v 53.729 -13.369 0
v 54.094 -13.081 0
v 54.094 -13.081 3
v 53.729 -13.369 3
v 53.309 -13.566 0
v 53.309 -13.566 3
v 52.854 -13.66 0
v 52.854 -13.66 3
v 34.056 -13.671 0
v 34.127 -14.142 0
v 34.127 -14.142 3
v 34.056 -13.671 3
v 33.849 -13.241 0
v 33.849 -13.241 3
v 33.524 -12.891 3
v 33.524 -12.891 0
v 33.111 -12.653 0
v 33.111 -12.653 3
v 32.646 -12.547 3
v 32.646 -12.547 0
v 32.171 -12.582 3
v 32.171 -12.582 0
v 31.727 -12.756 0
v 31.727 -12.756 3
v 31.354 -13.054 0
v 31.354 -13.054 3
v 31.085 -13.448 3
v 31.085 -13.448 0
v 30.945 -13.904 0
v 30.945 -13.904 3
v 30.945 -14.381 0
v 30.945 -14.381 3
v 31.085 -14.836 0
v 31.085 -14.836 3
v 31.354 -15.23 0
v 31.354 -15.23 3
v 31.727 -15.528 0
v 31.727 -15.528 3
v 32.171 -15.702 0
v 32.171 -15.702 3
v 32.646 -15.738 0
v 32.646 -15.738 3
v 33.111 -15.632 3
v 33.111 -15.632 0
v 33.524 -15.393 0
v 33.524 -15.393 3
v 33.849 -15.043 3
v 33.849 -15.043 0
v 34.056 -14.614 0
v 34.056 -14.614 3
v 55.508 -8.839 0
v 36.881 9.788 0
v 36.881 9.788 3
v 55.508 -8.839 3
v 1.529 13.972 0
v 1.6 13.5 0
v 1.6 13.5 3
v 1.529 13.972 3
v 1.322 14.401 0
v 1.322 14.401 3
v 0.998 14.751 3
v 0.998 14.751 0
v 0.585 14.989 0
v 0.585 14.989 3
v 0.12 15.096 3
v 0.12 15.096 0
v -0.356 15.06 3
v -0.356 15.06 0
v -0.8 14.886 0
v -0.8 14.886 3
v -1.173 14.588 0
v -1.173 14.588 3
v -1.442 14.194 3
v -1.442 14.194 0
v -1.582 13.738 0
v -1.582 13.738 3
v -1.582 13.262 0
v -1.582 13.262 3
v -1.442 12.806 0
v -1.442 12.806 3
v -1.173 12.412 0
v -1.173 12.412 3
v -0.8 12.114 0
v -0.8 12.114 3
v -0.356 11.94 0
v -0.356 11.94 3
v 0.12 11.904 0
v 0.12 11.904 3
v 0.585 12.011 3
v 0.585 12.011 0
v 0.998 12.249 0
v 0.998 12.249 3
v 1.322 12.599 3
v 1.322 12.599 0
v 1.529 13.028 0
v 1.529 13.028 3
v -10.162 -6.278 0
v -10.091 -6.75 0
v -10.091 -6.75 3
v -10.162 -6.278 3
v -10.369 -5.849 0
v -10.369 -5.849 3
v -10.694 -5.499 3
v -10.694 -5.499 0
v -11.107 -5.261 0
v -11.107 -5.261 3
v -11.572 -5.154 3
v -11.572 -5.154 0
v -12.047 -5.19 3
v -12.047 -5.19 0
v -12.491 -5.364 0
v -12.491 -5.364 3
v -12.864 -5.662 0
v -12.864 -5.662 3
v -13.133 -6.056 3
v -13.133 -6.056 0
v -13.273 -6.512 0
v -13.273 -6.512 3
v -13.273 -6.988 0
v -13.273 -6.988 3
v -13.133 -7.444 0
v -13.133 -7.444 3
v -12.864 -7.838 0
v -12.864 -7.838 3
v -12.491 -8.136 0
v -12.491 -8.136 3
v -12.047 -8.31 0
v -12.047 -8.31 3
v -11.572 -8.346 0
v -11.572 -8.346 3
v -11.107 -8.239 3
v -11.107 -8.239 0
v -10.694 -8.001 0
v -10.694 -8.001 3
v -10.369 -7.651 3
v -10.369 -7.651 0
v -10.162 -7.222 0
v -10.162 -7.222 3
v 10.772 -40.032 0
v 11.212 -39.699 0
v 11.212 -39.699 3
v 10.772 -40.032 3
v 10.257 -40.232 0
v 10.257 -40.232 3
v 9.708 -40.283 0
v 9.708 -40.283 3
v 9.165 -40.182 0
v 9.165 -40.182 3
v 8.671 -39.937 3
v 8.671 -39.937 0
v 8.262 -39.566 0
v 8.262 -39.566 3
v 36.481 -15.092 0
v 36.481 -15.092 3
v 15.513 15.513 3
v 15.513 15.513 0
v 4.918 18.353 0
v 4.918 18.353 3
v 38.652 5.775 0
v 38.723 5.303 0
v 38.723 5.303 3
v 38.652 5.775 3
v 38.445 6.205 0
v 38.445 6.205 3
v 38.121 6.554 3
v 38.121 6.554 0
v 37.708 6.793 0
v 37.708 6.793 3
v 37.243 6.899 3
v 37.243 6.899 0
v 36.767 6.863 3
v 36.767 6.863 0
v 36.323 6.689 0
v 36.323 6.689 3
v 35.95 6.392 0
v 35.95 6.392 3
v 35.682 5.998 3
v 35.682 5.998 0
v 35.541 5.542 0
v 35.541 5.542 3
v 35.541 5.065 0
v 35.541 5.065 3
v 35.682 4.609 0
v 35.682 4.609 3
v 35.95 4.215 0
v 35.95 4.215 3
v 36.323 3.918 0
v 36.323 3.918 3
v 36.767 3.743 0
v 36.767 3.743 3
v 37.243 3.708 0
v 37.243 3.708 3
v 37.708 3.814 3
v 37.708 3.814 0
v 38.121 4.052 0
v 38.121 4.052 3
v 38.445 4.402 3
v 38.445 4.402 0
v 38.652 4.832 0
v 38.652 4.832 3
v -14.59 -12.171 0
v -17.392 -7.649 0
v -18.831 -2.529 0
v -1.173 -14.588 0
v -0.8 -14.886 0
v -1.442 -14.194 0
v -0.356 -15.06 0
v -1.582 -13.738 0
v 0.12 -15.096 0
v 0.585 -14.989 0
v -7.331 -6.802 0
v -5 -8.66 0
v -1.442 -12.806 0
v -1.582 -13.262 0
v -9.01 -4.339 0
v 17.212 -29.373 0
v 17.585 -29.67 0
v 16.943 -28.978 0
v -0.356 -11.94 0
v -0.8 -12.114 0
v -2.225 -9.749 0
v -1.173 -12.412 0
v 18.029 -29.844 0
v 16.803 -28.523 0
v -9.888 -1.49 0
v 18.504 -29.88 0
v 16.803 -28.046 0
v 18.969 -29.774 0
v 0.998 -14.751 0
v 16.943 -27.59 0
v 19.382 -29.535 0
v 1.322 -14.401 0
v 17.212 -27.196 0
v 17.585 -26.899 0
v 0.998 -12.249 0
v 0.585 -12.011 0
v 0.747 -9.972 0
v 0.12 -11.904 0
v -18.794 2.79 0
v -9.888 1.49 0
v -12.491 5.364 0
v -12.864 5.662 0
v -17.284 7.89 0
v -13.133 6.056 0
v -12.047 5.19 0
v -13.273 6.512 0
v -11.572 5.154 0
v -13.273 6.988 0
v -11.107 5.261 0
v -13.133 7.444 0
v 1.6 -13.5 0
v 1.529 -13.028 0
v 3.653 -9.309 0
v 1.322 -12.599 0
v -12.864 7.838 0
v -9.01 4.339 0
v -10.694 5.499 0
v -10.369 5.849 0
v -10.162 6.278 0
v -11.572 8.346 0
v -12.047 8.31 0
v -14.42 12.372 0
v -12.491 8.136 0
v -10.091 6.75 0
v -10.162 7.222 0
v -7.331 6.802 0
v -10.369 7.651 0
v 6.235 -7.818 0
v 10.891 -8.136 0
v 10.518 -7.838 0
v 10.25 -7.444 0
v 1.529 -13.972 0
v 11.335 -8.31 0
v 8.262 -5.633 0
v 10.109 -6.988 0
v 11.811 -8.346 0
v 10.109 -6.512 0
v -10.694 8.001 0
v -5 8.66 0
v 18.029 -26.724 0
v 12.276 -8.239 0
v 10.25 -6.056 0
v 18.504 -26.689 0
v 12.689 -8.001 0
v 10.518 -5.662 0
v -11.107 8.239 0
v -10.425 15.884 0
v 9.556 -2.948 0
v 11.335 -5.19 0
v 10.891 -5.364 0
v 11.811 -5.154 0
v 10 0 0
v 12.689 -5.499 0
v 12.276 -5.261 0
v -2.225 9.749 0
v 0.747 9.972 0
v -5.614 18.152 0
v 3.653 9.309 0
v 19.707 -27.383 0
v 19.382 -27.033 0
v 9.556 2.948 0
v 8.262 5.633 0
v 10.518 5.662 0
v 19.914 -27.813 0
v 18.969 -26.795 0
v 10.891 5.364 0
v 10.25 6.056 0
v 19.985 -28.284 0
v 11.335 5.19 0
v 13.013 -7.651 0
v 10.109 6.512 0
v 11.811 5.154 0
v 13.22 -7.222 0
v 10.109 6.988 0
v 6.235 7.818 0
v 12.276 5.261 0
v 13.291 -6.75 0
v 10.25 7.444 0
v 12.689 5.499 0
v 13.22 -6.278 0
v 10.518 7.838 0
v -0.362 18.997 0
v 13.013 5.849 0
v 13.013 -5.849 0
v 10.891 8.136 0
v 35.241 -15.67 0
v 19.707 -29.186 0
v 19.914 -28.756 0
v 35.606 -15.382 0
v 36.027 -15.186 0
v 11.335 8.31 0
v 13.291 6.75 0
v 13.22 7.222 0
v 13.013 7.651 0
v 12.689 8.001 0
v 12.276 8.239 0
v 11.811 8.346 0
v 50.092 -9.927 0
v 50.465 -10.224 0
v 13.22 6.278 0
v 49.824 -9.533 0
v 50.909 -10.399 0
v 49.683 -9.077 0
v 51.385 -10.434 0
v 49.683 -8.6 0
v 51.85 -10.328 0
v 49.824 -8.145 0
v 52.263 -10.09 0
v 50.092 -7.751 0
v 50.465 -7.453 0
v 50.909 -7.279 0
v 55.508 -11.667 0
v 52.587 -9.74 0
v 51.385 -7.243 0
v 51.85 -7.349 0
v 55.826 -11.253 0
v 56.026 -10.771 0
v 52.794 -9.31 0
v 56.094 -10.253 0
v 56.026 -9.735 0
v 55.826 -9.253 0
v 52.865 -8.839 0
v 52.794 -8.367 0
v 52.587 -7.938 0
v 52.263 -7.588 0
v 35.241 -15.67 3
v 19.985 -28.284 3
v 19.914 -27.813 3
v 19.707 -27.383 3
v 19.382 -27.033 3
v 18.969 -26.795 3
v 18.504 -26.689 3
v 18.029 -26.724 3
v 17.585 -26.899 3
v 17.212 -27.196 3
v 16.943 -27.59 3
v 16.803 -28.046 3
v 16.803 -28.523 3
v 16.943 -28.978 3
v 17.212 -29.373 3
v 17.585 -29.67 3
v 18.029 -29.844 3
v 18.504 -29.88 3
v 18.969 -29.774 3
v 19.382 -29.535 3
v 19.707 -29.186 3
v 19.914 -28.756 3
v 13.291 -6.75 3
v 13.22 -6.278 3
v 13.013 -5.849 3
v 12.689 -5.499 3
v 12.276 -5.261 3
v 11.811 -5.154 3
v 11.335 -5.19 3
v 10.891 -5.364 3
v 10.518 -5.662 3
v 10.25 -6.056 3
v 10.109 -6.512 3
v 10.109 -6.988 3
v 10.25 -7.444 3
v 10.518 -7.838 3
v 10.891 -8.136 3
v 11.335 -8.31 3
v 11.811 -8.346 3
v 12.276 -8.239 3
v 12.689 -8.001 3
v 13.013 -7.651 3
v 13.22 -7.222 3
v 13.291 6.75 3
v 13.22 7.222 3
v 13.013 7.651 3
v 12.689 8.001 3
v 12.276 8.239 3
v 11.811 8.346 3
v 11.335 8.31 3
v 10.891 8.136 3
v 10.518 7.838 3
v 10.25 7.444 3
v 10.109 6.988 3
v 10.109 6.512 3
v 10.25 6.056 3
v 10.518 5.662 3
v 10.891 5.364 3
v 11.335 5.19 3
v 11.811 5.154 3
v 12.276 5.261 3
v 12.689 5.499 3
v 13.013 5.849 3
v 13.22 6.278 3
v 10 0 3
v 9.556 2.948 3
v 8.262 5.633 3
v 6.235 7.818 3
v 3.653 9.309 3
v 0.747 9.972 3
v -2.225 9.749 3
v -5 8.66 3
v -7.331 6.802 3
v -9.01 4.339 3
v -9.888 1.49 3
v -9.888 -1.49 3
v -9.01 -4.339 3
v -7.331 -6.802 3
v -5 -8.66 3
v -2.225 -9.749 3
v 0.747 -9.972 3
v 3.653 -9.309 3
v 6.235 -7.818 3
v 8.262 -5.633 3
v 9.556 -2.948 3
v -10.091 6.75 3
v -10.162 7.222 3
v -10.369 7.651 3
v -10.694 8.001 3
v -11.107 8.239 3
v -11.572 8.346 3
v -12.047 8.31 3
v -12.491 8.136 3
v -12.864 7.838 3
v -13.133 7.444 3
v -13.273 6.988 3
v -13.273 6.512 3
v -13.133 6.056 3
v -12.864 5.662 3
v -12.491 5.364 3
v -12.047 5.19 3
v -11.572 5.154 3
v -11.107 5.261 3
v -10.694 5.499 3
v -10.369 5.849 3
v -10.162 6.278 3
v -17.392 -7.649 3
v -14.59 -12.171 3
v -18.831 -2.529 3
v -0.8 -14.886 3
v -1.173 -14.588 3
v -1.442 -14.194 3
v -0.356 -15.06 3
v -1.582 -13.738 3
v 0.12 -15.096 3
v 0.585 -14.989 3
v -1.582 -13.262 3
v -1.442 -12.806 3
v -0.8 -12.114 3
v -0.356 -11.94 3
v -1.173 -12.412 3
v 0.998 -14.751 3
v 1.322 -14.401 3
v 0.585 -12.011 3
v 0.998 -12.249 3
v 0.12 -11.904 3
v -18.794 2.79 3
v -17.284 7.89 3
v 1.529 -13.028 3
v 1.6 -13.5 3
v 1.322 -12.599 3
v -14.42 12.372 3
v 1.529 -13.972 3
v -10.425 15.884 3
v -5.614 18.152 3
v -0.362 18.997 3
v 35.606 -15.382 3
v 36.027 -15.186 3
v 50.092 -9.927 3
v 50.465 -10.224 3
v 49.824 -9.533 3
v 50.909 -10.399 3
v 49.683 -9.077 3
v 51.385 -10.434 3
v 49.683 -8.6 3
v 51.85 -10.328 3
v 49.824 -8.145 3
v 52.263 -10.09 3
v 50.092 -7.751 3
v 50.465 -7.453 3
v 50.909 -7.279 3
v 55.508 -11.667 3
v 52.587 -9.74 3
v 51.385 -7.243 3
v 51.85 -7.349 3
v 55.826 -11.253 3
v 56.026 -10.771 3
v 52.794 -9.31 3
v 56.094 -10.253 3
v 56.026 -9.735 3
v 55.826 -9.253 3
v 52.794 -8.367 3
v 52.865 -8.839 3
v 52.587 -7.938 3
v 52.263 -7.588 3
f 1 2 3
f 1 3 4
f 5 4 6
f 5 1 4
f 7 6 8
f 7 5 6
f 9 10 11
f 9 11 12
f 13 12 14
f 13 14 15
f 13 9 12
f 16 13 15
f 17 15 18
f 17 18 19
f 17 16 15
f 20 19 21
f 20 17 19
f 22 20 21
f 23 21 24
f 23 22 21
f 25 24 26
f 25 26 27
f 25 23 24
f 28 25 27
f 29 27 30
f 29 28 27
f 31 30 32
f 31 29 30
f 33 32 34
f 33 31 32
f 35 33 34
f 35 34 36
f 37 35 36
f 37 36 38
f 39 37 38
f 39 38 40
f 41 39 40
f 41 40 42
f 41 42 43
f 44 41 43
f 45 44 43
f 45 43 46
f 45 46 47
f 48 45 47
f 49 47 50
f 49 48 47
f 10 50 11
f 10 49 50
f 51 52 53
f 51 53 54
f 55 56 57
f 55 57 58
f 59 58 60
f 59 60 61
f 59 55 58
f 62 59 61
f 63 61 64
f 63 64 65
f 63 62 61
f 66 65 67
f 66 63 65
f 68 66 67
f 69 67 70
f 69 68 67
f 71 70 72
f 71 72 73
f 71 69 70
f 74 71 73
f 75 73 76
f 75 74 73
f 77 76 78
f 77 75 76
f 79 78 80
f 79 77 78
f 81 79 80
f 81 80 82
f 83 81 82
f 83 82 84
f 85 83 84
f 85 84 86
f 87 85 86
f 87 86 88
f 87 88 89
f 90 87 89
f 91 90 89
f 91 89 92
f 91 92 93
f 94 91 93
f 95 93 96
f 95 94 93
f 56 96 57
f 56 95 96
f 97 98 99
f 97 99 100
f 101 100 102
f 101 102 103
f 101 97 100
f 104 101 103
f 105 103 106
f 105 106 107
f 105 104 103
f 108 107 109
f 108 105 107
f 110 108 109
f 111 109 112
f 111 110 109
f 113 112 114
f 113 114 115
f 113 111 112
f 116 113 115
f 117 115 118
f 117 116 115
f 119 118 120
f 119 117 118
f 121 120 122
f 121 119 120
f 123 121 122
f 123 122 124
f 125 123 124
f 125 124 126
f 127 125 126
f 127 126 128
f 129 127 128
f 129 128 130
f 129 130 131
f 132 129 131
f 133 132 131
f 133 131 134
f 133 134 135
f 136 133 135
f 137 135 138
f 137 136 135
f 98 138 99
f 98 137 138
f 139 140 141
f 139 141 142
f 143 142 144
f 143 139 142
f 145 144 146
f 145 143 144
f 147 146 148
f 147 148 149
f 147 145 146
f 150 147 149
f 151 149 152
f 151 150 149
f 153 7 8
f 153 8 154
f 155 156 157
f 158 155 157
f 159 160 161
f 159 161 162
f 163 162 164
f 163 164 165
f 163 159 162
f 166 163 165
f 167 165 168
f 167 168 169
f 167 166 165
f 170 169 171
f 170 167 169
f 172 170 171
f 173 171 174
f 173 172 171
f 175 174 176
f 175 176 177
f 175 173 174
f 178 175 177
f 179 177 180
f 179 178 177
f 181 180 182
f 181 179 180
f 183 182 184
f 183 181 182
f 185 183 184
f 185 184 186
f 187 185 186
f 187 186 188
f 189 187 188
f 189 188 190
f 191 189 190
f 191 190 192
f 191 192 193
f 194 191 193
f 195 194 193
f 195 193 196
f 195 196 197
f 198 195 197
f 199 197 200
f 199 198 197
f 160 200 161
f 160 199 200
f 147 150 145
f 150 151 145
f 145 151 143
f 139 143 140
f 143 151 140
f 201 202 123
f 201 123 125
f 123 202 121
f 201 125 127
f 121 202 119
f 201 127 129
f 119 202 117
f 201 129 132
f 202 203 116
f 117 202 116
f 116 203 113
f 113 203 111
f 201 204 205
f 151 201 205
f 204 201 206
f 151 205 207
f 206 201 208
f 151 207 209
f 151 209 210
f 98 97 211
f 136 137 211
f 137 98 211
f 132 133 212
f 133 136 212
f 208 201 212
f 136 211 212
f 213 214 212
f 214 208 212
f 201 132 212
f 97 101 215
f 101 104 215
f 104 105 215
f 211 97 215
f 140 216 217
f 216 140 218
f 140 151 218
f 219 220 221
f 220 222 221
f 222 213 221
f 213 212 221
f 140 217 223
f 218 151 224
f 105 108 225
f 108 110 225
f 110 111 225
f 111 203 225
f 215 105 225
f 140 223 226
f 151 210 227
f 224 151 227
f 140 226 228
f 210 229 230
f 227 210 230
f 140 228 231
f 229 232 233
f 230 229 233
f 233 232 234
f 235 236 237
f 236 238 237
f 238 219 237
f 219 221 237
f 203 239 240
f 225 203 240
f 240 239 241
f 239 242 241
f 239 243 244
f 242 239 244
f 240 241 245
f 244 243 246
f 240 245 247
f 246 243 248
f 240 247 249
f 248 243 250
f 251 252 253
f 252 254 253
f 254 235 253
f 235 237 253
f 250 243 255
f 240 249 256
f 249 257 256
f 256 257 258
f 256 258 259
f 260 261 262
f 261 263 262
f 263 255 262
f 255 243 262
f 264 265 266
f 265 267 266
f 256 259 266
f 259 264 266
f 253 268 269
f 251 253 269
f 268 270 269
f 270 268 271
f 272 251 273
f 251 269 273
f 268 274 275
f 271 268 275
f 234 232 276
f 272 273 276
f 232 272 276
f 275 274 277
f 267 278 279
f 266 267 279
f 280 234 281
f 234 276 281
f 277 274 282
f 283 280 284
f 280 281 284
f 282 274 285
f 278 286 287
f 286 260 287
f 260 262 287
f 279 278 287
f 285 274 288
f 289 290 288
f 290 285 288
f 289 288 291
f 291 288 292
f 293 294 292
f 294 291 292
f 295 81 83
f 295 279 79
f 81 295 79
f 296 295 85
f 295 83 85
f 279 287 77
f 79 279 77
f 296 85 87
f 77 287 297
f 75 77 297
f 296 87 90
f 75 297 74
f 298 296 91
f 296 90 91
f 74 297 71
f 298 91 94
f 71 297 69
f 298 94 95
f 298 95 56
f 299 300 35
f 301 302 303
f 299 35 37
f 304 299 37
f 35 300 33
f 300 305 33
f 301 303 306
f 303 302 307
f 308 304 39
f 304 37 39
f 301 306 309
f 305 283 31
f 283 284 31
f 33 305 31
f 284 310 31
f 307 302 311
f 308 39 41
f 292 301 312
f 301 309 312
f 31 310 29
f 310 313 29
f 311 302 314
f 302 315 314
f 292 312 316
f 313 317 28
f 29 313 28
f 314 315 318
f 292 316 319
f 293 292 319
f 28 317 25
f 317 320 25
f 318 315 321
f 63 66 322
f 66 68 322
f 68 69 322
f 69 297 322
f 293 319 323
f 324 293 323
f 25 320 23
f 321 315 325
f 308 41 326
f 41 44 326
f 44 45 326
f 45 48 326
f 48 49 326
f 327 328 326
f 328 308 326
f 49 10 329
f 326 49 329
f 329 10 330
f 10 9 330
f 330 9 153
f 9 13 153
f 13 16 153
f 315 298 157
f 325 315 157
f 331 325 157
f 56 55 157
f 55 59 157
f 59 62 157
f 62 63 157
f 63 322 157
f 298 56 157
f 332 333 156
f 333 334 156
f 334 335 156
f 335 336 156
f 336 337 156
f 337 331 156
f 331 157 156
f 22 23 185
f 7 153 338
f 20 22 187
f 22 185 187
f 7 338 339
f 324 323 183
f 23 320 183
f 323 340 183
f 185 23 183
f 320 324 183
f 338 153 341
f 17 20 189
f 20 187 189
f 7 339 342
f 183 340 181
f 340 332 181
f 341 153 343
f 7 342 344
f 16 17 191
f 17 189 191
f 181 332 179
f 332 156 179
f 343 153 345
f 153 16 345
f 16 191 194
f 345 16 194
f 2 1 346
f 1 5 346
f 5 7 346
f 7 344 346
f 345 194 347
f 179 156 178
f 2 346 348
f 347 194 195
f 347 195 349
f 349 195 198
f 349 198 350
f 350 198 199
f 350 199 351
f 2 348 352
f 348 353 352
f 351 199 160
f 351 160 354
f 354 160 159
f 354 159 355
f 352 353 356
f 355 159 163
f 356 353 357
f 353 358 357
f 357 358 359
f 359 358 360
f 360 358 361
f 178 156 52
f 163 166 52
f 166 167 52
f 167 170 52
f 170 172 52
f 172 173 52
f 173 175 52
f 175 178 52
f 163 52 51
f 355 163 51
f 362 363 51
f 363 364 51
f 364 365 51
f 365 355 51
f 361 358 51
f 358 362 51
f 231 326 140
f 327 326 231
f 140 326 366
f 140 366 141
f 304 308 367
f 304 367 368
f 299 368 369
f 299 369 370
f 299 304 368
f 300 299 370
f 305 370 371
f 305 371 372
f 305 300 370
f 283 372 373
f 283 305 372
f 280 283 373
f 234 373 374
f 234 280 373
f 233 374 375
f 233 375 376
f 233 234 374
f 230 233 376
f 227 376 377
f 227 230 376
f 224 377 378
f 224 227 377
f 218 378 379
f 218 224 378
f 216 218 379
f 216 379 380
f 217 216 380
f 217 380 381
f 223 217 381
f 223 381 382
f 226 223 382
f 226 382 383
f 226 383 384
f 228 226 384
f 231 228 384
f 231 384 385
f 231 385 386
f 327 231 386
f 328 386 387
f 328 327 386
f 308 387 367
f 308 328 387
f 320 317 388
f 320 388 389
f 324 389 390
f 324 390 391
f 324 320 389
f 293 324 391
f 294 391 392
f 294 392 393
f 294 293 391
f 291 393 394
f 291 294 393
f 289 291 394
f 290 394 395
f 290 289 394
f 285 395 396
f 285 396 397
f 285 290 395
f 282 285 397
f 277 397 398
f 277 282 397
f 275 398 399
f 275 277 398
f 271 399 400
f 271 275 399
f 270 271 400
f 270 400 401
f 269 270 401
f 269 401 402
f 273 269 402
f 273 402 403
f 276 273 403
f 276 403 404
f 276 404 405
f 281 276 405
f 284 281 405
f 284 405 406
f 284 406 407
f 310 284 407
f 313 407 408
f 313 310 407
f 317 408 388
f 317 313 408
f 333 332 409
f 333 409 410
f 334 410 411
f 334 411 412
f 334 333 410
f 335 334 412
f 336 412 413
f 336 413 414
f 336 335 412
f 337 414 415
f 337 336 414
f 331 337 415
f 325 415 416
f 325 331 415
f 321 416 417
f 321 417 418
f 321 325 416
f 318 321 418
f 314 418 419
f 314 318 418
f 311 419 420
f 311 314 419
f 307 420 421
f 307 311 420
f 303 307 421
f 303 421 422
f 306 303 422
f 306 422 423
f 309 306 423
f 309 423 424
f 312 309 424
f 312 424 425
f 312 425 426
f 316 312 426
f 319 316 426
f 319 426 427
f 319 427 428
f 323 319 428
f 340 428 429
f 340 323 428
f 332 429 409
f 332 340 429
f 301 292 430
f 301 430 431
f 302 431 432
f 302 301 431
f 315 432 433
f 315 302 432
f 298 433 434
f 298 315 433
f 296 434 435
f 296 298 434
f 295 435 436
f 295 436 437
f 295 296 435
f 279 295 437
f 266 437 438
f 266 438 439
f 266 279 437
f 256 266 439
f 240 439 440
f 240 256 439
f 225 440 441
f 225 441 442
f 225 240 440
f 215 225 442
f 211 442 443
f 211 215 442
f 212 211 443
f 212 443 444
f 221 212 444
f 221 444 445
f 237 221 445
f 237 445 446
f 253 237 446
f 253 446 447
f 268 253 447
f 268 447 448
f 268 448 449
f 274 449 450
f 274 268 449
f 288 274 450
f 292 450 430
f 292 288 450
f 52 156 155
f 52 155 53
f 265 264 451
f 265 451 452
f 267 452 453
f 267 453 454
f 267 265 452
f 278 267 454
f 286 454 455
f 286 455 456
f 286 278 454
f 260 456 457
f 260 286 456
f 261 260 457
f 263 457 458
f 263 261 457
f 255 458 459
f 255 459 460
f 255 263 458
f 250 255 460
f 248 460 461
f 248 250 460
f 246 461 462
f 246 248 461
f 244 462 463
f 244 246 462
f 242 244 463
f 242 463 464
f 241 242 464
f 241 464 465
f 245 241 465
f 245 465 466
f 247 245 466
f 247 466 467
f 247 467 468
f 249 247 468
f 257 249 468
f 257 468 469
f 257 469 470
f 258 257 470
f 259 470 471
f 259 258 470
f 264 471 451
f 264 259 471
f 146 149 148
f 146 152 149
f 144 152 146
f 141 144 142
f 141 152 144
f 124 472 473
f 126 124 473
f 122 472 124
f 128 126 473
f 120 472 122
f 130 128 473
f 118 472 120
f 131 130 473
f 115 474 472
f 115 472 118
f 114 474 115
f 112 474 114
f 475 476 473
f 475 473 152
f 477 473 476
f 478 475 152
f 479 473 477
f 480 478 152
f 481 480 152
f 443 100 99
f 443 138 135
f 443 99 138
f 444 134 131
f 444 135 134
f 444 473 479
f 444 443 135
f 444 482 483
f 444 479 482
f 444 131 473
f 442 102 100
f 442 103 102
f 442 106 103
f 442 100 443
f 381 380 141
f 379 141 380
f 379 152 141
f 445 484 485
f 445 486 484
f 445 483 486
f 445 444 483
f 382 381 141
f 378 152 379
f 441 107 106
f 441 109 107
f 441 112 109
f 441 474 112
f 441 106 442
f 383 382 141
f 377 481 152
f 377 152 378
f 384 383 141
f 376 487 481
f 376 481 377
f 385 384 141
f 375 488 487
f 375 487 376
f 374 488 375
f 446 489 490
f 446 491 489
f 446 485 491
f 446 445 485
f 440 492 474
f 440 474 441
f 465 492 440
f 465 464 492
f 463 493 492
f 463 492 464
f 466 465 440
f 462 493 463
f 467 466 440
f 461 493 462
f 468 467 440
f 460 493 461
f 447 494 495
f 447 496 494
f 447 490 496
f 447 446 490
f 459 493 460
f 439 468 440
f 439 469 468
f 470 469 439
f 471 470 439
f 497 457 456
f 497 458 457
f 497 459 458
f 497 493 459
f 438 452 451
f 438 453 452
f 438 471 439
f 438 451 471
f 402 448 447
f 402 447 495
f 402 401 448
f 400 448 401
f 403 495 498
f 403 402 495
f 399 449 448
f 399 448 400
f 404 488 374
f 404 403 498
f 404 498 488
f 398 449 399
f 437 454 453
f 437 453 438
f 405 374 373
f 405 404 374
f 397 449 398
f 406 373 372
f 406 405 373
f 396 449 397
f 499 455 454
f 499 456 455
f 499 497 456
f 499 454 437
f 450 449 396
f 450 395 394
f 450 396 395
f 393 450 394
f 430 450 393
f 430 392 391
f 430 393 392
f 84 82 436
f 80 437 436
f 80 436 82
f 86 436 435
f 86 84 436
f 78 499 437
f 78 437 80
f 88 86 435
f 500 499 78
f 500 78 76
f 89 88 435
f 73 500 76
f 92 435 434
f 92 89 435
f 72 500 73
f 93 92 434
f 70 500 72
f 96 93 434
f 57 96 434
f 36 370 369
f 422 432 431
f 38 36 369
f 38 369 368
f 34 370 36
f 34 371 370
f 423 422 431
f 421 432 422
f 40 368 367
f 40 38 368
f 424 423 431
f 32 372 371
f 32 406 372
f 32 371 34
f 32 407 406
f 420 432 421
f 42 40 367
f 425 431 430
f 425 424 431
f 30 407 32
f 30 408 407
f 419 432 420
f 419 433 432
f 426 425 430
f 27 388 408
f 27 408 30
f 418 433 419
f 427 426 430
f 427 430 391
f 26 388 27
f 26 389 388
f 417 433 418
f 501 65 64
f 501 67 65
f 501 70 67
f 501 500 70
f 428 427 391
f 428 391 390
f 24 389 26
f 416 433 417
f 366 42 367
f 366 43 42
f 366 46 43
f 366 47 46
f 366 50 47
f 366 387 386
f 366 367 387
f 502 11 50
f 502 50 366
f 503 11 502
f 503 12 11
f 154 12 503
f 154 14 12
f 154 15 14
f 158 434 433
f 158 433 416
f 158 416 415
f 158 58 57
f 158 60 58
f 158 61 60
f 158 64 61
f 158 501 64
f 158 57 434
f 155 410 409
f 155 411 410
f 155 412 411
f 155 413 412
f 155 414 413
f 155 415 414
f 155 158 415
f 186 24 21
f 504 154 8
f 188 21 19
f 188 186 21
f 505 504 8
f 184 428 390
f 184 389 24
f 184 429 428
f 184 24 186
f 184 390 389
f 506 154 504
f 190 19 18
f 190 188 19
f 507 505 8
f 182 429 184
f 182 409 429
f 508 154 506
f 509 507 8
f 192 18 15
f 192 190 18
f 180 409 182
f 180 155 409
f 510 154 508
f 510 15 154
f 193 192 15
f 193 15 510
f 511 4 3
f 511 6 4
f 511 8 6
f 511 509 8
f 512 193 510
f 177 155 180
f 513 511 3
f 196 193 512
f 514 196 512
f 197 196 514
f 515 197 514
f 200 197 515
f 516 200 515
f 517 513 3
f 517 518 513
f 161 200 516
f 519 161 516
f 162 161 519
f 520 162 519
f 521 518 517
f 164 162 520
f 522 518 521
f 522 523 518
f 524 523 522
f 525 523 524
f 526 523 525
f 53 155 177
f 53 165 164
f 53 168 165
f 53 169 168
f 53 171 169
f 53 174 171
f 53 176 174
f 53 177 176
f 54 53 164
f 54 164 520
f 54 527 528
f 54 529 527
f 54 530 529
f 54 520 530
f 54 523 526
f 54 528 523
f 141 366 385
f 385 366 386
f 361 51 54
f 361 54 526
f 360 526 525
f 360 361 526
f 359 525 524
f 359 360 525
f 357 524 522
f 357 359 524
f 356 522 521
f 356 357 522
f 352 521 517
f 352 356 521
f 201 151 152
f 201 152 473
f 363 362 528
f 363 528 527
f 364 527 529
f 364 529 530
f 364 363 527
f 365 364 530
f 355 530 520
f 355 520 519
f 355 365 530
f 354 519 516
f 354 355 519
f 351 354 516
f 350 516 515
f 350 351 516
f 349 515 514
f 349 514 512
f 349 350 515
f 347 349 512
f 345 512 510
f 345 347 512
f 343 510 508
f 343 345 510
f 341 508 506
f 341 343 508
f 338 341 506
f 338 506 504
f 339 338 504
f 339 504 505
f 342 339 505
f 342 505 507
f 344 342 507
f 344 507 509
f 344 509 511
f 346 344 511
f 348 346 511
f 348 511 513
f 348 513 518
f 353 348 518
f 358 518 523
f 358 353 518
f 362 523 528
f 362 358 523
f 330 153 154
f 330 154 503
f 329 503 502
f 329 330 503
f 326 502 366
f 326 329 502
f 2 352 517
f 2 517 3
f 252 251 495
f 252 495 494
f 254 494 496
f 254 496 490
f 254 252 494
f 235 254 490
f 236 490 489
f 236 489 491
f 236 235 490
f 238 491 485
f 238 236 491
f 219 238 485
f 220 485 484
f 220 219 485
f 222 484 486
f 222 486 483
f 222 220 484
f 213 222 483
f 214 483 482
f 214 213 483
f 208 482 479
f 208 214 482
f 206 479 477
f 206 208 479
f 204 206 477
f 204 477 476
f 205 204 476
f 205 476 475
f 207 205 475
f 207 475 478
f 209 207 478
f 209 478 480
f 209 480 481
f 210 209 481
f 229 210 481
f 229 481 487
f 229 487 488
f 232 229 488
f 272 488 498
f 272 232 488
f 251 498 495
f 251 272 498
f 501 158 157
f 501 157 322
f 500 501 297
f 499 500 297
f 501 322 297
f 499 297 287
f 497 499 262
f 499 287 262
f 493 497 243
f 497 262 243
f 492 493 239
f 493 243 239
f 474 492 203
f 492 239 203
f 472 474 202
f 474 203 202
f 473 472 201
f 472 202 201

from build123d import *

# Parameters (mm, degrees)
SKETCH_1_R          = 19
SKETCH_1_R_2        = 1.6
SKETCH_1_R_3        = 10
EXTRUDE_1_DEPTH     = 3
EXTRUDE_START       = -3
SKETCH_2_R          = 1.6
EXTRUDE_2_DEPTH     = 3
CUT_EXTRUDE_START   = -10
CUT_EXTRUDE_1_DEPTH = 10
EXTRUDE_4_DEPTH     = 3


with BuildPart() as part:
    # 草图1 → 凸台-拉伸1 (new body)
    with BuildSketch(Plane.XY):
        Circle(SKETCH_1_R)
        with Locations((0, 13.5)):
            Circle(SKETCH_1_R_2, mode=Mode.SUBTRACT)
        Circle(SKETCH_1_R_3, mode=Mode.SUBTRACT)
        with Locations((11.691342951, 6.75)):
            Circle(SKETCH_1_R_2, mode=Mode.SUBTRACT)
        with Locations((11.691342951, -6.75)):
            Circle(SKETCH_1_R_2, mode=Mode.SUBTRACT)
        with Locations((0, -13.5)):
            Circle(SKETCH_1_R_2, mode=Mode.SUBTRACT)
        with Locations((-11.691342951, -6.75)):
            Circle(SKETCH_1_R_2, mode=Mode.SUBTRACT)
        with Locations((-11.691342951, 6.75)):
            Circle(SKETCH_1_R_2, mode=Mode.SUBTRACT)
    extrude(amount=EXTRUDE_1_DEPTH)

    # 草图2 → 凸台-拉伸2 (add)
    with BuildSketch(Plane.XY.offset(3).offset(EXTRUDE_START)):
        with BuildLine():
            Line((24.748737342, 21.920310217), (55.507882323, -8.838834765))
            ThreePointArc((55.507882323, -8.838834765), (56.093668761, -10.253048327), (55.507882323, -11.66726189))
            Line((55.507882323, -11.66726189), (54.093668761, -13.081475452))
            ThreePointArc((54.093668761, -13.081475452), (53.524691722, -13.479877464), (52.853766684, -13.659651286))
            Line((52.853766684, -13.659651286), (36.481363532, -15.092050956))
            ThreePointArc((36.481363532, -15.092050956), (35.810438494, -15.271824778), (35.241461455, -15.67022679))
            Line((35.241461455, -15.67022679), (11.212279145, -39.699409101))
            ThreePointArc((11.212279145, -39.699409101), (9.707926642, -40.283163249), (8.262251105, -39.566317661))
            Line((8.262251105, -39.566317661), (-14.59023753, -12.170660163))
            ThreePointArc((-14.59023753, -12.170660163), (12.81586728, -14.026886535), (13.435028843, 13.435028843))
            Line((13.435028843, 13.435028843), (21.920310217, 21.920310217))
            ThreePointArc((21.920310217, 21.920310217), (23.334523779, 22.506096654), (24.748737342, 21.920310217))
        make_face()
        with Locations((51.265241636, -8.838834765)):
            Circle(SKETCH_2_R, mode=Mode.SUBTRACT)
        with Locations((37.123106012, 5.303300859)):
            Circle(SKETCH_2_R, mode=Mode.SUBTRACT)
        with Locations((18.384776311, -28.284271247)):
            Circle(SKETCH_2_R, mode=Mode.SUBTRACT)
        with Locations((32.526911935, -14.142135624)):
            Circle(SKETCH_2_R, mode=Mode.SUBTRACT)
    extrude(amount=EXTRUDE_2_DEPTH)

    # 草图5 → 切除-拉伸1 (cut)
    with BuildSketch(Plane.XY.offset(3).offset(CUT_EXTRUDE_START)):
        with BuildLine():
            Line((21.920310217, 21.920310217), (15.513435038, 15.513435038))
            Line((15.513435038, 15.513435038), (36.88104685, 9.788000708))
            Line((36.88104685, 9.788000708), (24.748737342, 21.920310217))
            ThreePointArc((24.748737342, 21.920310217), (23.334523779, 22.506096654), (21.920310217, 21.920310217))
        make_face()
    extrude(amount=CUT_EXTRUDE_1_DEPTH, mode=Mode.SUBTRACT)

    # 草图5<4> → 凸台-拉伸4 (add)
    with BuildSketch(Plane.XY.offset(3).offset(EXTRUDE_START)):
        with BuildLine():
            Line((15.513435038, 15.513435038), (4.917561857, 18.352590699))
            ThreePointArc((4.917561857, 18.352590699), (9.5, 16.454482672), (13.435028843, 13.435028843))
            Line((13.435028843, 13.435028843), (15.513435038, 15.513435038))
        make_face()
    extrude(amount=EXTRUDE_4_DEPTH)


solid = part.part
